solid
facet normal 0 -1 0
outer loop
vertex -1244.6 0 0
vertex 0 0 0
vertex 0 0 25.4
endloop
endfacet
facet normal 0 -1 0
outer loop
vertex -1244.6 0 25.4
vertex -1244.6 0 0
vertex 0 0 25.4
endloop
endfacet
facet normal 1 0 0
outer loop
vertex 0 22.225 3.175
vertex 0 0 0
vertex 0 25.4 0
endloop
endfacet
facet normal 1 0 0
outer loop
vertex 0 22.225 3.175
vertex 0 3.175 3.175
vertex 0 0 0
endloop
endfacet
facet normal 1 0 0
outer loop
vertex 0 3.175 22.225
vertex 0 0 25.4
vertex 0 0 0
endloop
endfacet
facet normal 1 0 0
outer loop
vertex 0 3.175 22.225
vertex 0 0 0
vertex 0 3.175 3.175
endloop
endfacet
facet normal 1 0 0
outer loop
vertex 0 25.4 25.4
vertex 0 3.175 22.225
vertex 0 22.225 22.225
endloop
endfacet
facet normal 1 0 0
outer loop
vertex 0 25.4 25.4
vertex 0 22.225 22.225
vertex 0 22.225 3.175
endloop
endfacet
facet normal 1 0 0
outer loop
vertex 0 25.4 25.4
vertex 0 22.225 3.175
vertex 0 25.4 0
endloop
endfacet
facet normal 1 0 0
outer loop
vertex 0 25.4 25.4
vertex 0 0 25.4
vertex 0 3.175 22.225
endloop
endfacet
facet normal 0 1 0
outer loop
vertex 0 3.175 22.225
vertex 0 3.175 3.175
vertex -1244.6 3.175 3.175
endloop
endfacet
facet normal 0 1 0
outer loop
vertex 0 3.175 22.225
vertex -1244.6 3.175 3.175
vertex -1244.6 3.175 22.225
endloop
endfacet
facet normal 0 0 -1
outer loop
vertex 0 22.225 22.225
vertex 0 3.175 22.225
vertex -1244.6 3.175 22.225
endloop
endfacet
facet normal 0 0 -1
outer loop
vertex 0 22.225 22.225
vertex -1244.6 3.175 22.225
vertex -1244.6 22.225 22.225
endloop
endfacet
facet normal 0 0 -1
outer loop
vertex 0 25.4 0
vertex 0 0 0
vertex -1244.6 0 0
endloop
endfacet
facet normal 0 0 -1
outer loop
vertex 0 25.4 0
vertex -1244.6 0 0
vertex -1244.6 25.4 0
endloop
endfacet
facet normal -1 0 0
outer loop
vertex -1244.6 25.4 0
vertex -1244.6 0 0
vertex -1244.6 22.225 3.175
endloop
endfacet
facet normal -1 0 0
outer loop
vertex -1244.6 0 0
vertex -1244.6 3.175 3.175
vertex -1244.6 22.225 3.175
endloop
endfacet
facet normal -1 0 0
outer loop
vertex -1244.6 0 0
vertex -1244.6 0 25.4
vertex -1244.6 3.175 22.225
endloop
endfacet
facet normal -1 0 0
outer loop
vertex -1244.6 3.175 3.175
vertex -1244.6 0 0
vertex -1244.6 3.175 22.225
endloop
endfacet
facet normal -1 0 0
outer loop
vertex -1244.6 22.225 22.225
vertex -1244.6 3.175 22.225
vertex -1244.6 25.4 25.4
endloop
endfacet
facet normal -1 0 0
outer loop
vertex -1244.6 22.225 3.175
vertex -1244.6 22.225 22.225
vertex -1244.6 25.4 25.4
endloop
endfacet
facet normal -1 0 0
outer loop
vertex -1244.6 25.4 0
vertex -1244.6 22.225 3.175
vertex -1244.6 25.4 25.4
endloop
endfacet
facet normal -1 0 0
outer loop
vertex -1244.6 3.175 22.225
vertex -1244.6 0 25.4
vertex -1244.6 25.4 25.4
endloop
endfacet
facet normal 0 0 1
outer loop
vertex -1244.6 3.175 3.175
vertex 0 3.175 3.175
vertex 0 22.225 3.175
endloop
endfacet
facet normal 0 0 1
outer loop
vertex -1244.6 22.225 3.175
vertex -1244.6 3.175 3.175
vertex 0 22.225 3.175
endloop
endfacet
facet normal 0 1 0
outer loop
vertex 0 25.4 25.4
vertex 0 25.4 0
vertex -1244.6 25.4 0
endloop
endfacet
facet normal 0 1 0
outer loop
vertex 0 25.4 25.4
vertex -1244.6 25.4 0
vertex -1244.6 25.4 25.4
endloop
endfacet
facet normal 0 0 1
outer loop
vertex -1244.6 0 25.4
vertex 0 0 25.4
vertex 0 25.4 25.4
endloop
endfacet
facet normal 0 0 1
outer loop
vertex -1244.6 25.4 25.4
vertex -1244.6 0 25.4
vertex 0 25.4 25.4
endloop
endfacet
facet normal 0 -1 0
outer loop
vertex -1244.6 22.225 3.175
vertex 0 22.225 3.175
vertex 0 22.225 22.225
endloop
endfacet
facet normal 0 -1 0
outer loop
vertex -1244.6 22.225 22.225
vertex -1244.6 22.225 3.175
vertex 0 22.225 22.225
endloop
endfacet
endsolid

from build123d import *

# Parameters (mm, degrees)
F0_W     = 25.4
F0_H     = 25.4
F0_W_2   = 19.05
F0_H_2   = 19.05
F1_DEPTH = 1244.6


with BuildPart() as f1:
    # F0 (on Right) → F1 (new body)
    with BuildSketch(Plane.YZ):
        with Locations((12.7, 12.7)):
            Rectangle(F0_W, F0_H)
        with Locations((12.7, 12.7)):
            Rectangle(F0_W_2, F0_H_2, mode=Mode.SUBTRACT)
    extrude(amount=-F1_DEPTH)


solid = f1.part
